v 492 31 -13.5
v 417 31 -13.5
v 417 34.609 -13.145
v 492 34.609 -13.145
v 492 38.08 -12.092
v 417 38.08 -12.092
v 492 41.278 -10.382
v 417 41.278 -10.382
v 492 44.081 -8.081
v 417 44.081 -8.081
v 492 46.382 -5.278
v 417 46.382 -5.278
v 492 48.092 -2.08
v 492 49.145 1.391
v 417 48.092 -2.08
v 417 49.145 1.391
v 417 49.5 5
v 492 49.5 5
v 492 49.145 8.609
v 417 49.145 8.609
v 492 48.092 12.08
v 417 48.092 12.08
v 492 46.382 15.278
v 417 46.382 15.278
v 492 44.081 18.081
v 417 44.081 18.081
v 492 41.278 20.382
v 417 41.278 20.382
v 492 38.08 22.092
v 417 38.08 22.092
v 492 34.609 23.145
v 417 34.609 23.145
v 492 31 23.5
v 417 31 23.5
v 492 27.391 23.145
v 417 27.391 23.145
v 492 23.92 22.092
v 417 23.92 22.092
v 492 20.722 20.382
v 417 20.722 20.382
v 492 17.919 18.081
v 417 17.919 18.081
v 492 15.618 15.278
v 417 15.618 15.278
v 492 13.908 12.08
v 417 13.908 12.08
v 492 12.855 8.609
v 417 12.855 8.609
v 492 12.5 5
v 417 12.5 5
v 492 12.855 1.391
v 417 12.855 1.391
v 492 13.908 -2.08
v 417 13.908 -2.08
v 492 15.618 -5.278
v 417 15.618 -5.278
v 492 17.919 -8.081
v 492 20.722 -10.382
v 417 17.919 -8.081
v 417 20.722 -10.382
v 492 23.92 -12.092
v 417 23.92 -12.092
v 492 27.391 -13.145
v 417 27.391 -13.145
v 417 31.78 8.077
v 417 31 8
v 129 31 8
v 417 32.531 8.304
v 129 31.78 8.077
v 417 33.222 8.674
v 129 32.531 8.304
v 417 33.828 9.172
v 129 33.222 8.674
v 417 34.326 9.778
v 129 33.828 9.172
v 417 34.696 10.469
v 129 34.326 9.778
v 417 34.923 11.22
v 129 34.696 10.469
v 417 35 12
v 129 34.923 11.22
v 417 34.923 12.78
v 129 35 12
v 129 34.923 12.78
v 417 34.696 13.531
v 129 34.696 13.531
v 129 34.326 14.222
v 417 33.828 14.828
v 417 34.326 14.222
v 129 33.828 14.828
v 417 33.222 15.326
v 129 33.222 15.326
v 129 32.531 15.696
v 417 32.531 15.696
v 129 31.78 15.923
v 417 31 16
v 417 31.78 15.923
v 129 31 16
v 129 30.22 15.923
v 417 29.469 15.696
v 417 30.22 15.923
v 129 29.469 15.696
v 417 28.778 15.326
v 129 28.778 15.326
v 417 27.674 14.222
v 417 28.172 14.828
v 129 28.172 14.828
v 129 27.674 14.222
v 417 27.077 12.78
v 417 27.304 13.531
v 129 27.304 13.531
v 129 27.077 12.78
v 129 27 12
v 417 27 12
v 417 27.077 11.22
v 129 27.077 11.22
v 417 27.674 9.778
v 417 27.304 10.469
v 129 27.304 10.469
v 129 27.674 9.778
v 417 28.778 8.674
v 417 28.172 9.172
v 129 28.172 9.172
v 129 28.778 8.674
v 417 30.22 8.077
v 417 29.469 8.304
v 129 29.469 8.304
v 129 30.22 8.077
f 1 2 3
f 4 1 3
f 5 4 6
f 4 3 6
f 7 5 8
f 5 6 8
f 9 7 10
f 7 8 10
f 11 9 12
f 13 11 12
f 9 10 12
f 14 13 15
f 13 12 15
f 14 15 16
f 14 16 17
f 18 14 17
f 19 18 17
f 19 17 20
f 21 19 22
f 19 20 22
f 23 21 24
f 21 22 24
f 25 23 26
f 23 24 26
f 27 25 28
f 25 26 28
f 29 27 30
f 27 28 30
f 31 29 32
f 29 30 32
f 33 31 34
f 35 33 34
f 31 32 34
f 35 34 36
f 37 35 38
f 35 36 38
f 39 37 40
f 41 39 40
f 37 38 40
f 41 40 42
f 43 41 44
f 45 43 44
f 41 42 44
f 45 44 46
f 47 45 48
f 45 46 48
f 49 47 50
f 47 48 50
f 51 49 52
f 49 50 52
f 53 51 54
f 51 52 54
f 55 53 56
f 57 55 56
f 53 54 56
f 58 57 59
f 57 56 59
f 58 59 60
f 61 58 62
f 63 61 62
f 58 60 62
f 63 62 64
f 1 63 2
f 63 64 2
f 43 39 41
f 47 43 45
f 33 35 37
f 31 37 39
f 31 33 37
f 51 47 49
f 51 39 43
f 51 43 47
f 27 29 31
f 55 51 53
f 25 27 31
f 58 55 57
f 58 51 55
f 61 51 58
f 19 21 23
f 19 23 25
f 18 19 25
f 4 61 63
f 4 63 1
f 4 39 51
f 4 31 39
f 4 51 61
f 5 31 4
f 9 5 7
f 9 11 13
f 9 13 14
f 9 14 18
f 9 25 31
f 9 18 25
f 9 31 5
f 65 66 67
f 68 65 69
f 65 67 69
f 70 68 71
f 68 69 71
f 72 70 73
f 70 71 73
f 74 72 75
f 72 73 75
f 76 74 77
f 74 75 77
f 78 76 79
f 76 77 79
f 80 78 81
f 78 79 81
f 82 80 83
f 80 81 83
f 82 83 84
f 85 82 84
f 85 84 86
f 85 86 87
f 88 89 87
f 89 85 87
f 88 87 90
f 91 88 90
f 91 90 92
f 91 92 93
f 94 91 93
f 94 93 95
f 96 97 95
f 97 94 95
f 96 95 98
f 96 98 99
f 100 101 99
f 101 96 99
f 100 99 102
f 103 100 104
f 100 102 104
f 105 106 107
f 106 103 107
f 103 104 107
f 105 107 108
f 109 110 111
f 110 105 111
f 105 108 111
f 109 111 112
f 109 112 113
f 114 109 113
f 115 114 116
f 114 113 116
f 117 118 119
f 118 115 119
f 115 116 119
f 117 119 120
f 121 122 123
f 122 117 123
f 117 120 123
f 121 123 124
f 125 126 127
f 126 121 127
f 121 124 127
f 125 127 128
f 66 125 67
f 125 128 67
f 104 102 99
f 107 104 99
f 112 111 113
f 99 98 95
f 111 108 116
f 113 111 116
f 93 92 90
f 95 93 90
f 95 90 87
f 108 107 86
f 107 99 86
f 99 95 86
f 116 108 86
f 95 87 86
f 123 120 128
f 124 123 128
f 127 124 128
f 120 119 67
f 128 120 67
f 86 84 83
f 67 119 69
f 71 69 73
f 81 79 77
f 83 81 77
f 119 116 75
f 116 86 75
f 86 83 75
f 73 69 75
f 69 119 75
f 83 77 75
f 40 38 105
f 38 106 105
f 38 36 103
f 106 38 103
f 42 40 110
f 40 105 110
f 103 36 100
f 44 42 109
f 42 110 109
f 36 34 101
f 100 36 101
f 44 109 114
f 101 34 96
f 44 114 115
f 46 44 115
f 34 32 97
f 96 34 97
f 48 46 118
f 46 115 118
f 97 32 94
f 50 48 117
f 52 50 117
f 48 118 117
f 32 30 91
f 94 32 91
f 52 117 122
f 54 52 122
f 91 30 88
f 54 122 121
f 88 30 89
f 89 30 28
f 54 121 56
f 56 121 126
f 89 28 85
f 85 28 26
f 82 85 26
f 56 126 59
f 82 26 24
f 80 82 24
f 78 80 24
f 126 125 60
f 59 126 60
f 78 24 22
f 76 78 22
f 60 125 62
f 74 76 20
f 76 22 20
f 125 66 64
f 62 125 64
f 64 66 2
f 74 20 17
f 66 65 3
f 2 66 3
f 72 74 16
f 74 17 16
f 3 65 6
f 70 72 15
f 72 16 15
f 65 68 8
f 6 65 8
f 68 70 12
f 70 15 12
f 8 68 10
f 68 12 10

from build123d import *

# Parameters (mm, degrees)
CYLINDER049_R     = 18.5
CYLINDER049_DEPTH = 75
CYLINDER048_R     = 4
CYLINDER048_DEPTH = 350


with BuildPart() as cylinder049:
    # Cylinder049 → Cylinder049 (new body)
    with BuildSketch(Plane(origin=(336, 31, 5), x_dir=(0, 0, -1), z_dir=(1, 0, 0))):
        Circle(CYLINDER049_R)
    extrude(amount=CYLINDER049_DEPTH)


with BuildPart() as motor_threaded_bar_metal:
    # Cylinder048 → Cylinder048 (new body)
    with BuildSketch(Plane(origin=(48, 31, 12), x_dir=(0, 0, -1), z_dir=(1, 0, 0))):
        Circle(CYLINDER048_R)
    extrude(amount=CYLINDER048_DEPTH)

    # Fusion147: union Cylinder049
    add(cylinder049.part)


with BuildPart() as motor_threaded_bar_metal_1:
    # Fusion147 placement: moved
    add(motor_threaded_bar_metal.part.moved(Location((81, 0, 0))))


solid = motor_threaded_bar_metal_1.part
